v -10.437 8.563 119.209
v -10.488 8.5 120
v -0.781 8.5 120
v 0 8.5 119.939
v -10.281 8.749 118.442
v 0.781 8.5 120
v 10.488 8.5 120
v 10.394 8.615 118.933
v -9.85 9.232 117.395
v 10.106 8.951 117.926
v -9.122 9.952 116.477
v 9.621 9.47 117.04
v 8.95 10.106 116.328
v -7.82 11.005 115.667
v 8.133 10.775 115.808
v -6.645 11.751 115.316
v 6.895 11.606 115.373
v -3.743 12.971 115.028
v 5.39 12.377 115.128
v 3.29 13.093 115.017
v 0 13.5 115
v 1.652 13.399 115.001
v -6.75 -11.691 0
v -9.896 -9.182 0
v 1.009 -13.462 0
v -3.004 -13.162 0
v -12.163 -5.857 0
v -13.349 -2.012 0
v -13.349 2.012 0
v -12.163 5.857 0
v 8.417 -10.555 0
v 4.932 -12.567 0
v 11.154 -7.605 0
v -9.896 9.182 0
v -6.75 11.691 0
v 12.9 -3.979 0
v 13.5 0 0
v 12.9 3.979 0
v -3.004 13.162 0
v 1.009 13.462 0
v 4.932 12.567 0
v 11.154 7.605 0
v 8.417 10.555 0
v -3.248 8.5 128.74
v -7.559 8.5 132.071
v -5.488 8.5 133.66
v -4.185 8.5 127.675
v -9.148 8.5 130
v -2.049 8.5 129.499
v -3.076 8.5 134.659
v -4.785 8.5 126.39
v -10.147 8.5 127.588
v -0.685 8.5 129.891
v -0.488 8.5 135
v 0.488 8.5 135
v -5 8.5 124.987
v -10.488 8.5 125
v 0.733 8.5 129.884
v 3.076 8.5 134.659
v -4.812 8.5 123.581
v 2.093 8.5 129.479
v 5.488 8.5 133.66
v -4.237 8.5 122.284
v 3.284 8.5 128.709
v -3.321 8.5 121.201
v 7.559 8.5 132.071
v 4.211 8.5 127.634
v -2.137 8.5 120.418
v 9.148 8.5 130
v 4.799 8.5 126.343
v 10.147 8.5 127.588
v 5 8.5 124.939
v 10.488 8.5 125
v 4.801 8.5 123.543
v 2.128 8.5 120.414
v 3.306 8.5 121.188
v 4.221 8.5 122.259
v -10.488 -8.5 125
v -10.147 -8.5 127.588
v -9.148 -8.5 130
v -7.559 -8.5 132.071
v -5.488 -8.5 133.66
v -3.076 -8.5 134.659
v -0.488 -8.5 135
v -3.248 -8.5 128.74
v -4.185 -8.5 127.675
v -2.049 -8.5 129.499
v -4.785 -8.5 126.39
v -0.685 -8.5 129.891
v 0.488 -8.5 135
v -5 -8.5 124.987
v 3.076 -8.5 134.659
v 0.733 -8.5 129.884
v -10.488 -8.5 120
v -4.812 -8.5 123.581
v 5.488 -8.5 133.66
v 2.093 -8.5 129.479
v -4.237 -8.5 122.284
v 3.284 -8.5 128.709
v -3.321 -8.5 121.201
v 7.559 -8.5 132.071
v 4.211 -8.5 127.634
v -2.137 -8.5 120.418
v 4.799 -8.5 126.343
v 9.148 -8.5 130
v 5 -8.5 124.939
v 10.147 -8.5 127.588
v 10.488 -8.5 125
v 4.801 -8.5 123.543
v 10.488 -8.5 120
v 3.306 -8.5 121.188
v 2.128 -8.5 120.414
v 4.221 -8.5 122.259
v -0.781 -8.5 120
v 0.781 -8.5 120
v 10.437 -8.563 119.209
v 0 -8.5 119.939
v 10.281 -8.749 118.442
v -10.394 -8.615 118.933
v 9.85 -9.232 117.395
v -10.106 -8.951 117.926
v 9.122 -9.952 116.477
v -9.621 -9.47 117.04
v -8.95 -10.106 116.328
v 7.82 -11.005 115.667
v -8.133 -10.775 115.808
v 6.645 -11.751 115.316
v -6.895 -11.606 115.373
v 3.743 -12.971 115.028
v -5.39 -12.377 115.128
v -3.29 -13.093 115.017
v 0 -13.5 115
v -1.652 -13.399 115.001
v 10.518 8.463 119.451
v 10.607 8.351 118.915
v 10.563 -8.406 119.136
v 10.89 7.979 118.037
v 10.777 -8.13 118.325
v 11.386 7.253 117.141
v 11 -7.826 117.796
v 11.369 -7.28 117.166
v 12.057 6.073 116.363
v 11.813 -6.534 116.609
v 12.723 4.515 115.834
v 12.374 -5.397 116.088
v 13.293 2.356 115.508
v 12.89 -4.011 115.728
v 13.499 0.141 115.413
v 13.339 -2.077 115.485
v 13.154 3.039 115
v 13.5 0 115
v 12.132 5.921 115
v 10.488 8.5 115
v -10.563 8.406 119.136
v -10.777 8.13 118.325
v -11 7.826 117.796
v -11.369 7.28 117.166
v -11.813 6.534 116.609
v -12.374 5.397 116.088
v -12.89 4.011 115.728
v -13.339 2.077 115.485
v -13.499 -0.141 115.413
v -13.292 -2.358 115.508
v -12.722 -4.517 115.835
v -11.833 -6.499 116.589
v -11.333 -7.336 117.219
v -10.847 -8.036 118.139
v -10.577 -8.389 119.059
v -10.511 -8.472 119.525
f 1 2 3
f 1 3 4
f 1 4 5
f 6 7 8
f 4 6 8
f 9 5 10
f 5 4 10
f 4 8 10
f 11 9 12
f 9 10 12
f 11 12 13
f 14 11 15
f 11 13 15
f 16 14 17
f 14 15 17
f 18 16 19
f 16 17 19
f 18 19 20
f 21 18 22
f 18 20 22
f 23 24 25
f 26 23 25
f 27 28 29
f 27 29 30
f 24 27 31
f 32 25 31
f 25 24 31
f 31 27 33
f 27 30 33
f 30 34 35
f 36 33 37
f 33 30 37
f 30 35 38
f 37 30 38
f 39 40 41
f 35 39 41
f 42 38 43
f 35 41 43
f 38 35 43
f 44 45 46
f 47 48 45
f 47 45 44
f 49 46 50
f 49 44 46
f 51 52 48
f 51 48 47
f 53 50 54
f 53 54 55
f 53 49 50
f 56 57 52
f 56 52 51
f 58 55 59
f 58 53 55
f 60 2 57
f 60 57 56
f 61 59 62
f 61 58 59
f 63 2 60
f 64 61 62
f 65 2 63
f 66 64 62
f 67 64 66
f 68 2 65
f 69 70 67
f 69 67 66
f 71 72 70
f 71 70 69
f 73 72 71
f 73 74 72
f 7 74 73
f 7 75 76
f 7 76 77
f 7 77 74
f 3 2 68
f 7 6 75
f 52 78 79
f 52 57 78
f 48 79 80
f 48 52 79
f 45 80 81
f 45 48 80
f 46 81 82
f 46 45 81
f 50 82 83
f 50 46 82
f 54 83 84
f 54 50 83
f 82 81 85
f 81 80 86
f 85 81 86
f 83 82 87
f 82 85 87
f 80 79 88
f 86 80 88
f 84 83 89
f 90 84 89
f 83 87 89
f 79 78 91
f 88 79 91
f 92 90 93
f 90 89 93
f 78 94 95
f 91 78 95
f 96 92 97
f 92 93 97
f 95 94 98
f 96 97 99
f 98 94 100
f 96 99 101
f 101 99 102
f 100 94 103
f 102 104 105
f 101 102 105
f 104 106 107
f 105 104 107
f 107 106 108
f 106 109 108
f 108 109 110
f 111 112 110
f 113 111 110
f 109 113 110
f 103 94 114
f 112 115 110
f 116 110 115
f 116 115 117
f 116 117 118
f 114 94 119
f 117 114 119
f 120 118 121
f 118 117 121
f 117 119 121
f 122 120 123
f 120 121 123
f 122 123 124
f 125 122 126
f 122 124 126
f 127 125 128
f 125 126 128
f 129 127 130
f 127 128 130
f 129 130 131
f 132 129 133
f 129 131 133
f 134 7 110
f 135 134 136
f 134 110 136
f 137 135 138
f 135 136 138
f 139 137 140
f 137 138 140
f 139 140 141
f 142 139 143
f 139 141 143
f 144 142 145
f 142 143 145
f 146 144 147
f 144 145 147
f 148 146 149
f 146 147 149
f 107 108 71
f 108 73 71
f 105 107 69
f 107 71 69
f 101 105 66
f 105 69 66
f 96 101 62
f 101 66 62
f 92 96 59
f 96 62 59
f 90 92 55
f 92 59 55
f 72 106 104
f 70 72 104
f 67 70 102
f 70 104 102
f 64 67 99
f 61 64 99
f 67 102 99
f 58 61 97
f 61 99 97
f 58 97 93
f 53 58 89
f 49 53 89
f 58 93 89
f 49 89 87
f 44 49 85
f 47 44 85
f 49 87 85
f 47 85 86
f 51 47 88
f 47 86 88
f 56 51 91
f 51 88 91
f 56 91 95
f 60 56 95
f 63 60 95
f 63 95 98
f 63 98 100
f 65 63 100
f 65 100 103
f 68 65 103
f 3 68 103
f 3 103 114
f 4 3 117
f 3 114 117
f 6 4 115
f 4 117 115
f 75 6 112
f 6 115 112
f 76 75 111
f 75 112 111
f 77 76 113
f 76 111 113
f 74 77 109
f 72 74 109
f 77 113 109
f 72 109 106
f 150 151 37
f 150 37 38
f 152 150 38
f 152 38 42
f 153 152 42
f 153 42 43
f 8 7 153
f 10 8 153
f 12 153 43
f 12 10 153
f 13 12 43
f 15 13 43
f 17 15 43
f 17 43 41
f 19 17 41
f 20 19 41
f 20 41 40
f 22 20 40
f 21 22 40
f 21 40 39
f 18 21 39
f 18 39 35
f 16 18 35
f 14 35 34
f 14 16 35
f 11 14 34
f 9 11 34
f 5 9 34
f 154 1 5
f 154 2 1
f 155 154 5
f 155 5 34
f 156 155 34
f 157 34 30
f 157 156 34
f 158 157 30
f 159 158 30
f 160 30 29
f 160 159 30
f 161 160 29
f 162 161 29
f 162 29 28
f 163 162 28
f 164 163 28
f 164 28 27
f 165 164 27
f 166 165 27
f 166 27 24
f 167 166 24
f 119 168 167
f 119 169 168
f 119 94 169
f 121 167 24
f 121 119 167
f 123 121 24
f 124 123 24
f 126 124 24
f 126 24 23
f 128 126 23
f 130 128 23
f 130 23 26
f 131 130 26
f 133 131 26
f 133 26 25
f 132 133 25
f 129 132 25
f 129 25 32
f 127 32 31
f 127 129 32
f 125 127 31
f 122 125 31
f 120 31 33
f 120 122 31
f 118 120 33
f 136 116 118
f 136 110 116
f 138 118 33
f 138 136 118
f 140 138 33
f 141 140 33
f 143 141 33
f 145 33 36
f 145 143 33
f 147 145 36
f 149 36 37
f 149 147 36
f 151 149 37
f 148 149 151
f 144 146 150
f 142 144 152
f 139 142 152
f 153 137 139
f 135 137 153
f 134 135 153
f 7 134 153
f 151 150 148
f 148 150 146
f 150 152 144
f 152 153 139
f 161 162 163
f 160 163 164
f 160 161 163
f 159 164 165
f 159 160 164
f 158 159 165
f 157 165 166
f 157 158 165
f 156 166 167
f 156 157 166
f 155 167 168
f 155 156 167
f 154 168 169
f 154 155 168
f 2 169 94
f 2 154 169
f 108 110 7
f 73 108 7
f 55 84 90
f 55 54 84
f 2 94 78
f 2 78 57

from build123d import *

# Parameters (mm, degrees)
F0_R         = 13.5
F1_DEPTH     = 115
F2_W         = 20.9761769634
F2_H         = 17
F3_DEPTH     = 20
F4_R         = 5
F5_DEPTH     = 25
F6_R         = 10
F7_T4_DEPTH  = 20.9761769634
F7_S5_R      = 5
F7_T6_DEPTH  = 13
F7_S7_R      = 13.5
F7_T8_DEPTH  = 13
F7_T12_DEPTH = 20.9761769634
F7_S13_R     = 13.5
F7_T14_DEPTH = 13
F7_S15_R     = 5
F7_T16_DEPTH = 13
F8_T4_DEPTH  = 42
F8_S5_R      = 13.5
F8_T6_DEPTH  = 23
F8_T10_DEPTH = 42
F8_S11_R     = 13.5
F8_T12_DEPTH = 23


# Not quite as in the source:
# - a fillet or chamfer that OpenCascade refuses, or shapes differently, is made with other operations: its cross-section is extruded or revolved along the edge and cut away or added


with BuildPart() as f1:
    # F0 (on Top) → F1 (new body)
    with BuildSketch(Plane.XY):
        Circle(F0_R)
    extrude(amount=F1_DEPTH)

    # F2 (on face) → F3 (join)
    with BuildSketch(Plane.XY.offset(115)):
        Rectangle(F2_W, F2_H)
    extrude(amount=F3_DEPTH)

    # F4 (on face) → F5 (cut)
    with BuildSketch(Plane.XZ.offset(8.5)):
        with Locations((0, 124.938569963)):
            Circle(F4_R)
    extrude(amount=-F5_DEPTH, mode=Mode.SUBTRACT)

    # F6
    f6_edges = [f1.edges().sort_by_distance(p)[0] for p in [
        (10.488088, 0, 135),
        (-10.488088, 0, 135),
    ]]
    fillet(f6_edges, radius=F6_R)

    # F7: fillet of radius 5 on 2 edges, made by hand


with BuildPart() as f7_tool2:
    # F7_s3 → F7_t4 (new body)
    with BuildSketch(Plane.YZ.offset(-10.4880884817)):
        with BuildLine():
            ThreePointArc((-8.5, 120), (-9.9644660941, 116.4644660941), (-13.5, 115))
            Line((-13.5, 115), (-8.5, 115))
            Line((-8.5, 115), (-8.5, 120))
        make_face()
    extrude(amount=F7_T4_DEPTH)

    # F7_s5 → F7_t6 (cut, symmetric)
    with BuildSketch(Plane.XZ.offset(11)):
        with Locations((0, 124.938569963)):
            Circle(F7_S5_R)
    extrude(amount=F7_T6_DEPTH, both=True, mode=Mode.SUBTRACT)

    # F7_s7 → F7_t8 (intersect, symmetric)
    with BuildSketch(Plane.XY.offset(117.5)):
        Circle(F7_S7_R)
    extrude(amount=F7_T8_DEPTH, both=True, mode=Mode.INTERSECT)


with BuildPart() as f1_1:
    add(f1.part)

    # F7_t1: union F7_tool2
    add(f7_tool2.part)


with BuildPart() as f7_tool10:
    # F7_s11 → F7_t12 (new body)
    with BuildSketch(Plane.YZ.offset(10.4880884817)):
        with BuildLine():
            ThreePointArc((8.5, 120), (9.9644660941, 116.4644660941), (13.5, 115))
            Line((13.5, 115), (8.5, 115))
            Line((8.5, 115), (8.5, 120))
        make_face()
    extrude(amount=-F7_T12_DEPTH)

    # F7_s13 → F7_t14 (intersect, symmetric)
    with BuildSketch(Plane.XY.offset(117.5)):
        Circle(F7_S13_R)
    extrude(amount=F7_T14_DEPTH, both=True, mode=Mode.INTERSECT)

    # F7_s15 → F7_t16 (cut, symmetric)
    with BuildSketch(Plane.XZ.offset(-11)):
        with Locations((0, 124.938569963)):
            Circle(F7_S15_R)
    extrude(amount=F7_T16_DEPTH, both=True, mode=Mode.SUBTRACT)


with BuildPart() as f1_2:
    add(f1_1.part)

    # F7_t9: union F7_tool10
    add(f7_tool10.part)

    # F8: fillet of radius 5 on 2 edges, made by hand


with BuildPart() as f8_tool2:
    # F8_s3 → F8_t4 (new body)
    with BuildSketch(Plane.XZ.offset(21)):
        with BuildLine():
            ThreePointArc((10.4880884817, 120), (11.9525545758, 116.4644660941), (15.4880884817, 115))
            Line((15.4880884817, 115), (10.4880884817, 115))
            Line((10.4880884817, 115), (10.4880884817, 120))
        make_face()
    extrude(amount=-F8_T4_DEPTH)

    # F8_s5 → F8_t6 (intersect, symmetric)
    with BuildSketch(Plane.XY.offset(117.5)):
        Circle(F8_S5_R)
    extrude(amount=F8_T6_DEPTH, both=True, mode=Mode.INTERSECT)


with BuildPart() as f1_3:
    add(f1_2.part)

    # F8_t1: union F8_tool2
    add(f8_tool2.part)


with BuildPart() as f8_tool8:
    # F8_s9 → F8_t10 (new body)
    with BuildSketch(Plane.XZ.offset(-21)):
        with BuildLine():
            ThreePointArc((-15.4880884817, 115), (-11.9525545758, 116.4644660941), (-10.4880884817, 120))
            Line((-10.4880884817, 120), (-10.4880884817, 115))
            Line((-10.4880884817, 115), (-15.4880884817, 115))
        make_face()
    extrude(amount=F8_T10_DEPTH)

    # F8_s11 → F8_t12 (intersect, symmetric)
    with BuildSketch(Plane.XY.offset(117.5)):
        Circle(F8_S11_R)
    extrude(amount=F8_T12_DEPTH, both=True, mode=Mode.INTERSECT)


with BuildPart() as f1_4:
    add(f1_3.part)

    # F8_t7: union F8_tool8
    add(f8_tool8.part)


solid = f1_4.part
